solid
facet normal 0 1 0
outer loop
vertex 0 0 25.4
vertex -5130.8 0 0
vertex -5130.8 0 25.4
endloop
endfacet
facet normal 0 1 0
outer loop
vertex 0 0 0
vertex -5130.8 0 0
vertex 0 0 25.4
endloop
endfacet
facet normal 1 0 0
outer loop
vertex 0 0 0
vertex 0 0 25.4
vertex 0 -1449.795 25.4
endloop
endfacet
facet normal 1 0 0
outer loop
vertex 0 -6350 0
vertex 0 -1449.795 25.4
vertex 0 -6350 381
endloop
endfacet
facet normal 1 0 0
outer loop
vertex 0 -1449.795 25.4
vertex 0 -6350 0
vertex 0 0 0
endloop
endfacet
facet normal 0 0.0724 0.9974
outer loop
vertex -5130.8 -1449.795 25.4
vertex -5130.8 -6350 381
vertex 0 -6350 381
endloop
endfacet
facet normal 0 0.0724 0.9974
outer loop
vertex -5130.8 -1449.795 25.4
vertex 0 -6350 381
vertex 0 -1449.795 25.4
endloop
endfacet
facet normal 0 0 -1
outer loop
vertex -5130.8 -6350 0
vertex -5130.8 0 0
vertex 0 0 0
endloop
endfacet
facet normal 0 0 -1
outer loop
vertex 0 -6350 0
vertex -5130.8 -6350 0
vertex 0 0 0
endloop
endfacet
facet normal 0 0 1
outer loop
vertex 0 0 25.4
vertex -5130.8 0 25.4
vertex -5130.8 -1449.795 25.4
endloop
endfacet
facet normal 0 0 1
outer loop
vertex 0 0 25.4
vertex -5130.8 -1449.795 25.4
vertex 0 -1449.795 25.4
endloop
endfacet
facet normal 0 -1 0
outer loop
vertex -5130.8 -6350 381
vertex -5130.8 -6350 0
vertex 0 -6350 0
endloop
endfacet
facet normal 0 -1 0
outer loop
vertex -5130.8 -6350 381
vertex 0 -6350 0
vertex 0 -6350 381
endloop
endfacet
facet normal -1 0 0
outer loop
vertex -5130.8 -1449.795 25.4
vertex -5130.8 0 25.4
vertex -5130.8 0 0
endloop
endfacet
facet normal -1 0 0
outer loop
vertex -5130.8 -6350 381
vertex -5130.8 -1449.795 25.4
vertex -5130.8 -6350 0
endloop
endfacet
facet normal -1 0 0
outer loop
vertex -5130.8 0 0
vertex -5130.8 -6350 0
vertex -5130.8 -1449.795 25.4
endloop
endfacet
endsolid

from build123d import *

# Parameters (mm, degrees)
F0_W     = 5130.8
F0_H     = 6350
F1_DEPTH = 25.4
F3_DEPTH = 5130.8


with BuildPart() as f1:
    # F0 (on Top) → F1 (new body)
    with BuildSketch(Plane.XY):
        with Locations((-2565.4, -3175)):
            Rectangle(F0_W, F0_H)
    extrude(amount=F1_DEPTH)

    # F2 (on face) → F3 (join)
    with BuildSketch(Plane(origin=(-5130.8, 0, 0), x_dir=(0, -1, 0), z_dir=(-1, 0, 0))):
        Polygon((1449.794888, 25.4), (6350, 25.4), (6350, 381), align=None)
    extrude(amount=-F3_DEPTH)


solid = f1.part
